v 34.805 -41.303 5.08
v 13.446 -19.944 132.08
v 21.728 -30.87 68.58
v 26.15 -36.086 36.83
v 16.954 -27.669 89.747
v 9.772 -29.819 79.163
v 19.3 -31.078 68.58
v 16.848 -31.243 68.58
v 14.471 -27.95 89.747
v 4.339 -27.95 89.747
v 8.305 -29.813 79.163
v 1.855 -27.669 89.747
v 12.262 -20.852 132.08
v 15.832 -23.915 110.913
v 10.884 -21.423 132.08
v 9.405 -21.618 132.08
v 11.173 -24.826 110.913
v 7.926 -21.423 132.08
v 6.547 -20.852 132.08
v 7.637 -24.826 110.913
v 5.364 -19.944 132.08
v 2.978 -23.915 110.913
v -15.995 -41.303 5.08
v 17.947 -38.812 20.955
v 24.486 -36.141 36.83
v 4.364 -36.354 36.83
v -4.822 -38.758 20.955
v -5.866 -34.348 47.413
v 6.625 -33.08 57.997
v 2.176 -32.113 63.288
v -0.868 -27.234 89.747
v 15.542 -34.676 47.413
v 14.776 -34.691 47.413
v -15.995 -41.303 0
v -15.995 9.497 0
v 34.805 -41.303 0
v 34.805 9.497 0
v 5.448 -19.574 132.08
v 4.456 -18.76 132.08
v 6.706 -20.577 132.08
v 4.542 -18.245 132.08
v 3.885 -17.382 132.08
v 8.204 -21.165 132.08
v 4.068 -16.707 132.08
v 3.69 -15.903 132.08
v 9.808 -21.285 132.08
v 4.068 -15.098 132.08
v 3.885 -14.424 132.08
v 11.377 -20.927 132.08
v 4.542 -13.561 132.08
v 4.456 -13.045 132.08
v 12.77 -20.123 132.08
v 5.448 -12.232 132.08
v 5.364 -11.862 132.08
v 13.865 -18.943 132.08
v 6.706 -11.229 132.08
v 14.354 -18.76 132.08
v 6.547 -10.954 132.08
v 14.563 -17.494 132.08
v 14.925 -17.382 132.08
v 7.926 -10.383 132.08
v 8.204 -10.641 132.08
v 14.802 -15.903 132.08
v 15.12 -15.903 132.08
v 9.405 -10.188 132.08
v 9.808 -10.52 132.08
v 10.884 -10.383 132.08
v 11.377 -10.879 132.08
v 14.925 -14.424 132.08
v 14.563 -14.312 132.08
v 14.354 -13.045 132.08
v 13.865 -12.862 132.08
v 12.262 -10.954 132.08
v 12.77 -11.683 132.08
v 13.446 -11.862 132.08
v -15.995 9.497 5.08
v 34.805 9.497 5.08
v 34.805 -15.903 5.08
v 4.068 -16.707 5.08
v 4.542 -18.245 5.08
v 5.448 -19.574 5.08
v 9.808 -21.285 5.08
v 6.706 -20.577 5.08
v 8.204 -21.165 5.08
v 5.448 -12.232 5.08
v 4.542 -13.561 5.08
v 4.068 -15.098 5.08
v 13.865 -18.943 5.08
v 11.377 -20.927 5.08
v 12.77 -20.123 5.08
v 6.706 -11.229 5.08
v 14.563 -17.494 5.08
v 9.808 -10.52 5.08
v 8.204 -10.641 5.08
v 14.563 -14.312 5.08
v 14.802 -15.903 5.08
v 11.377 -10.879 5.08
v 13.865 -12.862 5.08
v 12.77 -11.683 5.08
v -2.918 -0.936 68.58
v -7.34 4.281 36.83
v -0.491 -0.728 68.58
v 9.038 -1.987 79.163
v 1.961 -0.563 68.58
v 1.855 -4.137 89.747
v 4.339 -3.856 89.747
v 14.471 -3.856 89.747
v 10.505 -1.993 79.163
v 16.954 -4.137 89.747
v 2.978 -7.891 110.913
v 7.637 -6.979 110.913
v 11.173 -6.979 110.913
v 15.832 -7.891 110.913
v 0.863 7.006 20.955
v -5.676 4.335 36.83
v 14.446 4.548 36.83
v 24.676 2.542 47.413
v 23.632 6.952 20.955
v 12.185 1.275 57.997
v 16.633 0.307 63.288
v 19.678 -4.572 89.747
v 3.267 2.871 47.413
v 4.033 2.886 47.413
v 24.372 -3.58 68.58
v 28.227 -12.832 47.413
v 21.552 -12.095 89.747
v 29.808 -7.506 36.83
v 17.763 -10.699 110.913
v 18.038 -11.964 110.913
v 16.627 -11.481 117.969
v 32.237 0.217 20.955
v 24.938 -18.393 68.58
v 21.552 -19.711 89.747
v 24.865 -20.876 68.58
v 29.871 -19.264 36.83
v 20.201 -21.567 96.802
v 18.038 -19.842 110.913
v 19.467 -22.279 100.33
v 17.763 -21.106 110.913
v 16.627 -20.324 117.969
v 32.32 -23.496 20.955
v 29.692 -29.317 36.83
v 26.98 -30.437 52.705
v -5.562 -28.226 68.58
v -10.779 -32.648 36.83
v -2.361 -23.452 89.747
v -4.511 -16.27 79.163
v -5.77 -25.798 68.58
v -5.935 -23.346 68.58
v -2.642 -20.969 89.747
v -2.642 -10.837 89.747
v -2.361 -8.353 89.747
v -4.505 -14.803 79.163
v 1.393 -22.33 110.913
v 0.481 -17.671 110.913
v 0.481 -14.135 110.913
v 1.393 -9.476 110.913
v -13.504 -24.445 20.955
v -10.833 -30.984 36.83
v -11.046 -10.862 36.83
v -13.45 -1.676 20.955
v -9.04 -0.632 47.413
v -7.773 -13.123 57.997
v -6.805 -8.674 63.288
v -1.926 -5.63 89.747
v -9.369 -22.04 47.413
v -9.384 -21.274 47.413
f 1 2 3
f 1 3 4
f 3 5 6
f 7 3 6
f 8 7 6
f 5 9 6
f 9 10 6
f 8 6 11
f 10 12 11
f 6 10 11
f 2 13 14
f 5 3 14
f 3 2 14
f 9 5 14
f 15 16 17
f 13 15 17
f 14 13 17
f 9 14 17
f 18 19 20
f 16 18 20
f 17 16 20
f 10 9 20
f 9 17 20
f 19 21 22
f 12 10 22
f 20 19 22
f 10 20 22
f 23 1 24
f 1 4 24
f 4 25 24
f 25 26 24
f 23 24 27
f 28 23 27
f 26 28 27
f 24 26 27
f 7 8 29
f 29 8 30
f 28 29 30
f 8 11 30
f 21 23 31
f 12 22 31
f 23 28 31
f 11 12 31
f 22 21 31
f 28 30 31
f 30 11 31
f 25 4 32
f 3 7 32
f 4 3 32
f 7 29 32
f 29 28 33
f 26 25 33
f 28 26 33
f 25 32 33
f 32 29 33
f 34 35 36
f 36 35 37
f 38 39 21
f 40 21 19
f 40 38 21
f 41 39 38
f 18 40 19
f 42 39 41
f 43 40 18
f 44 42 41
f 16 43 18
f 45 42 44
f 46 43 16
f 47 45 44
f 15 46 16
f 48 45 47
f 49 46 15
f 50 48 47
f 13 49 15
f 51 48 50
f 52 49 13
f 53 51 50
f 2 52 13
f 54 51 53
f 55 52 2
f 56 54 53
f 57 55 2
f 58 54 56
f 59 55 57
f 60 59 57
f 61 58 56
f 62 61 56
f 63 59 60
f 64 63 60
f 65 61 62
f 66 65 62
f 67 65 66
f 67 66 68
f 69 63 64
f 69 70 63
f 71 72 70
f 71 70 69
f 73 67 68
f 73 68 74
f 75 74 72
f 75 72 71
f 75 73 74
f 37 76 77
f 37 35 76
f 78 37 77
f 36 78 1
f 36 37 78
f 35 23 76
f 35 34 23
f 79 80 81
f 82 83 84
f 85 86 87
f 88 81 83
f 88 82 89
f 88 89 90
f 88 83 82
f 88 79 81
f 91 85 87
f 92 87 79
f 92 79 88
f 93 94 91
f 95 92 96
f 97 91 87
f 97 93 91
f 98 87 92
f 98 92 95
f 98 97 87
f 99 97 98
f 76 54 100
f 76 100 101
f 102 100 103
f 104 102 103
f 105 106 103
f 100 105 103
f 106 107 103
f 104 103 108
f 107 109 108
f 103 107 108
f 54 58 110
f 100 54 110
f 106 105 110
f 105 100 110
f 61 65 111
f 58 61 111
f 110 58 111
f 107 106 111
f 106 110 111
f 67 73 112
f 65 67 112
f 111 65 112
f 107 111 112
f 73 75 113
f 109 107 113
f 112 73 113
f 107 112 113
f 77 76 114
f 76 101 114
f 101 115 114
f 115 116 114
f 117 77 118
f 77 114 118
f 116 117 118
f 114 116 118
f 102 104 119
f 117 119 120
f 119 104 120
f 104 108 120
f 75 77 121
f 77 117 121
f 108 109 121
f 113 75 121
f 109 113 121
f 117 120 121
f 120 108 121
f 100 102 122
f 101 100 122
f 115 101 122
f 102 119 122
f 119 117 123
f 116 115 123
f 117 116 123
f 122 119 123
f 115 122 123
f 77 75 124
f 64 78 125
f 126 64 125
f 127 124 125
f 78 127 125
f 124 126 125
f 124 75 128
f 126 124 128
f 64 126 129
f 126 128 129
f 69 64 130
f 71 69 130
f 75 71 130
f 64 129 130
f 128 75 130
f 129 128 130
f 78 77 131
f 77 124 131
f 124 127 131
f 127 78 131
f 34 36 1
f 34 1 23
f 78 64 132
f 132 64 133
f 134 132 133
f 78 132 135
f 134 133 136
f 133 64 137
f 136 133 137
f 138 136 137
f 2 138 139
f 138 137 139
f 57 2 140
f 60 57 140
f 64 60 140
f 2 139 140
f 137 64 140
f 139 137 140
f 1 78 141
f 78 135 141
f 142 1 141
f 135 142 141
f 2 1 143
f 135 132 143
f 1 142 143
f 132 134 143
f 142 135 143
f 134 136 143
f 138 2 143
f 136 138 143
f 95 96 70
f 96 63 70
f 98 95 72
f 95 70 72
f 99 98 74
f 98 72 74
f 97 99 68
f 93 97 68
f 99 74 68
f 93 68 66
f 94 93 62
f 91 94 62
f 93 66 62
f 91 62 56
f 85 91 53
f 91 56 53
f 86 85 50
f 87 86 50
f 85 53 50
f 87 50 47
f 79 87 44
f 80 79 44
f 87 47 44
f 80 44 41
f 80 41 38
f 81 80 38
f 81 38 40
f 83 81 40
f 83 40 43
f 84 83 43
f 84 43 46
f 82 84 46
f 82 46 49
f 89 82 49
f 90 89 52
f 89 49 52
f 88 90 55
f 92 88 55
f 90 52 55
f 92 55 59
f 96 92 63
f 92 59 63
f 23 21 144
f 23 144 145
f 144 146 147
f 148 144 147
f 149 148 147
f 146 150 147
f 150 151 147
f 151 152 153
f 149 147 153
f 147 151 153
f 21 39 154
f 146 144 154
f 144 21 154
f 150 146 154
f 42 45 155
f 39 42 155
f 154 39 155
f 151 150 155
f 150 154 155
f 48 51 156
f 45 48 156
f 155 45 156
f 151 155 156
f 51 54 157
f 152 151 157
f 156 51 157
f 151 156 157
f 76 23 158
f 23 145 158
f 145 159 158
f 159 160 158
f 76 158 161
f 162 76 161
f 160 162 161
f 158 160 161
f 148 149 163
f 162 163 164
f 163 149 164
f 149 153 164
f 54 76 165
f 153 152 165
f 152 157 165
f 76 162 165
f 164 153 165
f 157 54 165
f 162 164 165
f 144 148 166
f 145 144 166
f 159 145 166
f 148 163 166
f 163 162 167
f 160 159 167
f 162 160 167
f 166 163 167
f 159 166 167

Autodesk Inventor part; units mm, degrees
ref_plane "YZ Plane" through (0, 0, 0) normal (1, 0, 0) x (0, 1, 0)
ref_plane "XZ Plane" through (0, 0, 0) normal (0, 1, 0) x (-1, 0, 0)
ref_plane "XY Plane" through (0, 0, 0) normal (0, 0, 1) x (1, 0, 0)
sketch "Sketch1" plane through (0, 0, 0) normal (0, 0, 1) x (1, 0, 0)
  line L0 (-15.9951, 9.4971) -> (34.8049, 9.4971)
  line L1 (34.8049, 9.4971) -> (34.8049, -41.3029)
  line L2 (34.8049, -41.3029) -> (-15.9951, -41.3029)
  line L3 (-15.9951, -41.3029) -> (-15.9951, 9.4971)
  point P0 (0, 0)
  dimension "d0" = 50.8
  dimension "d1" = 50.8
extrude "Extrusion1" add sketch "Sketch1" along normal blind 5.08
ref_plane "Work Plane1" through (0, 0, 132.08) normal (0, 0, 1) x (1, 0, 0)
sketch "Sketch2" plane through (0, 0, 5.08) normal (0, 0, 1) x (1, 0, 0)
  point P0 (0, 0)
sketch "Sketch3" plane through (0, 0, 132.08) normal (0, 0, 1) x (1, 0, 0)
  line L0 (34.8049, 9.4971) -> (-15.9951, 9.4971) projected
  line L1 (-15.9951, -41.3029) -> (34.8049, -41.3029) projected
  line L2 (-15.9951, 9.4971) -> (34.8049, -41.3029) construction
  line L3 (34.8049, 9.4971) -> (-15.9951, -41.3029) construction
  circle A0 centre (9.4049, -15.9029) radius 5.715
  point P0 (0, 0)
  dimension "d5" = 11.43
loft "Loft1" add profiles "Sketch3" section 1 edges at (9.4049, 9.4971, 5.08) (-15.9951, -15.9029, 5.08) (9.4049, -41.3029, 5.08) (34.8049, -15.9029, 5.08)
sketch "Sketch4" plane through (9.4049, -15.9029, 132.08) normal (0, 0, 1) x (1, 0, 0)
  circle A0 centre (0, 0) radius 5.3975
  point P0 (-9.4049, 15.9029)
  dimension "d11" = 10.795
extrude "Extrusion2" cut sketch "Sketch4" against normal blind 127
properties part number "arrowadaptor"
